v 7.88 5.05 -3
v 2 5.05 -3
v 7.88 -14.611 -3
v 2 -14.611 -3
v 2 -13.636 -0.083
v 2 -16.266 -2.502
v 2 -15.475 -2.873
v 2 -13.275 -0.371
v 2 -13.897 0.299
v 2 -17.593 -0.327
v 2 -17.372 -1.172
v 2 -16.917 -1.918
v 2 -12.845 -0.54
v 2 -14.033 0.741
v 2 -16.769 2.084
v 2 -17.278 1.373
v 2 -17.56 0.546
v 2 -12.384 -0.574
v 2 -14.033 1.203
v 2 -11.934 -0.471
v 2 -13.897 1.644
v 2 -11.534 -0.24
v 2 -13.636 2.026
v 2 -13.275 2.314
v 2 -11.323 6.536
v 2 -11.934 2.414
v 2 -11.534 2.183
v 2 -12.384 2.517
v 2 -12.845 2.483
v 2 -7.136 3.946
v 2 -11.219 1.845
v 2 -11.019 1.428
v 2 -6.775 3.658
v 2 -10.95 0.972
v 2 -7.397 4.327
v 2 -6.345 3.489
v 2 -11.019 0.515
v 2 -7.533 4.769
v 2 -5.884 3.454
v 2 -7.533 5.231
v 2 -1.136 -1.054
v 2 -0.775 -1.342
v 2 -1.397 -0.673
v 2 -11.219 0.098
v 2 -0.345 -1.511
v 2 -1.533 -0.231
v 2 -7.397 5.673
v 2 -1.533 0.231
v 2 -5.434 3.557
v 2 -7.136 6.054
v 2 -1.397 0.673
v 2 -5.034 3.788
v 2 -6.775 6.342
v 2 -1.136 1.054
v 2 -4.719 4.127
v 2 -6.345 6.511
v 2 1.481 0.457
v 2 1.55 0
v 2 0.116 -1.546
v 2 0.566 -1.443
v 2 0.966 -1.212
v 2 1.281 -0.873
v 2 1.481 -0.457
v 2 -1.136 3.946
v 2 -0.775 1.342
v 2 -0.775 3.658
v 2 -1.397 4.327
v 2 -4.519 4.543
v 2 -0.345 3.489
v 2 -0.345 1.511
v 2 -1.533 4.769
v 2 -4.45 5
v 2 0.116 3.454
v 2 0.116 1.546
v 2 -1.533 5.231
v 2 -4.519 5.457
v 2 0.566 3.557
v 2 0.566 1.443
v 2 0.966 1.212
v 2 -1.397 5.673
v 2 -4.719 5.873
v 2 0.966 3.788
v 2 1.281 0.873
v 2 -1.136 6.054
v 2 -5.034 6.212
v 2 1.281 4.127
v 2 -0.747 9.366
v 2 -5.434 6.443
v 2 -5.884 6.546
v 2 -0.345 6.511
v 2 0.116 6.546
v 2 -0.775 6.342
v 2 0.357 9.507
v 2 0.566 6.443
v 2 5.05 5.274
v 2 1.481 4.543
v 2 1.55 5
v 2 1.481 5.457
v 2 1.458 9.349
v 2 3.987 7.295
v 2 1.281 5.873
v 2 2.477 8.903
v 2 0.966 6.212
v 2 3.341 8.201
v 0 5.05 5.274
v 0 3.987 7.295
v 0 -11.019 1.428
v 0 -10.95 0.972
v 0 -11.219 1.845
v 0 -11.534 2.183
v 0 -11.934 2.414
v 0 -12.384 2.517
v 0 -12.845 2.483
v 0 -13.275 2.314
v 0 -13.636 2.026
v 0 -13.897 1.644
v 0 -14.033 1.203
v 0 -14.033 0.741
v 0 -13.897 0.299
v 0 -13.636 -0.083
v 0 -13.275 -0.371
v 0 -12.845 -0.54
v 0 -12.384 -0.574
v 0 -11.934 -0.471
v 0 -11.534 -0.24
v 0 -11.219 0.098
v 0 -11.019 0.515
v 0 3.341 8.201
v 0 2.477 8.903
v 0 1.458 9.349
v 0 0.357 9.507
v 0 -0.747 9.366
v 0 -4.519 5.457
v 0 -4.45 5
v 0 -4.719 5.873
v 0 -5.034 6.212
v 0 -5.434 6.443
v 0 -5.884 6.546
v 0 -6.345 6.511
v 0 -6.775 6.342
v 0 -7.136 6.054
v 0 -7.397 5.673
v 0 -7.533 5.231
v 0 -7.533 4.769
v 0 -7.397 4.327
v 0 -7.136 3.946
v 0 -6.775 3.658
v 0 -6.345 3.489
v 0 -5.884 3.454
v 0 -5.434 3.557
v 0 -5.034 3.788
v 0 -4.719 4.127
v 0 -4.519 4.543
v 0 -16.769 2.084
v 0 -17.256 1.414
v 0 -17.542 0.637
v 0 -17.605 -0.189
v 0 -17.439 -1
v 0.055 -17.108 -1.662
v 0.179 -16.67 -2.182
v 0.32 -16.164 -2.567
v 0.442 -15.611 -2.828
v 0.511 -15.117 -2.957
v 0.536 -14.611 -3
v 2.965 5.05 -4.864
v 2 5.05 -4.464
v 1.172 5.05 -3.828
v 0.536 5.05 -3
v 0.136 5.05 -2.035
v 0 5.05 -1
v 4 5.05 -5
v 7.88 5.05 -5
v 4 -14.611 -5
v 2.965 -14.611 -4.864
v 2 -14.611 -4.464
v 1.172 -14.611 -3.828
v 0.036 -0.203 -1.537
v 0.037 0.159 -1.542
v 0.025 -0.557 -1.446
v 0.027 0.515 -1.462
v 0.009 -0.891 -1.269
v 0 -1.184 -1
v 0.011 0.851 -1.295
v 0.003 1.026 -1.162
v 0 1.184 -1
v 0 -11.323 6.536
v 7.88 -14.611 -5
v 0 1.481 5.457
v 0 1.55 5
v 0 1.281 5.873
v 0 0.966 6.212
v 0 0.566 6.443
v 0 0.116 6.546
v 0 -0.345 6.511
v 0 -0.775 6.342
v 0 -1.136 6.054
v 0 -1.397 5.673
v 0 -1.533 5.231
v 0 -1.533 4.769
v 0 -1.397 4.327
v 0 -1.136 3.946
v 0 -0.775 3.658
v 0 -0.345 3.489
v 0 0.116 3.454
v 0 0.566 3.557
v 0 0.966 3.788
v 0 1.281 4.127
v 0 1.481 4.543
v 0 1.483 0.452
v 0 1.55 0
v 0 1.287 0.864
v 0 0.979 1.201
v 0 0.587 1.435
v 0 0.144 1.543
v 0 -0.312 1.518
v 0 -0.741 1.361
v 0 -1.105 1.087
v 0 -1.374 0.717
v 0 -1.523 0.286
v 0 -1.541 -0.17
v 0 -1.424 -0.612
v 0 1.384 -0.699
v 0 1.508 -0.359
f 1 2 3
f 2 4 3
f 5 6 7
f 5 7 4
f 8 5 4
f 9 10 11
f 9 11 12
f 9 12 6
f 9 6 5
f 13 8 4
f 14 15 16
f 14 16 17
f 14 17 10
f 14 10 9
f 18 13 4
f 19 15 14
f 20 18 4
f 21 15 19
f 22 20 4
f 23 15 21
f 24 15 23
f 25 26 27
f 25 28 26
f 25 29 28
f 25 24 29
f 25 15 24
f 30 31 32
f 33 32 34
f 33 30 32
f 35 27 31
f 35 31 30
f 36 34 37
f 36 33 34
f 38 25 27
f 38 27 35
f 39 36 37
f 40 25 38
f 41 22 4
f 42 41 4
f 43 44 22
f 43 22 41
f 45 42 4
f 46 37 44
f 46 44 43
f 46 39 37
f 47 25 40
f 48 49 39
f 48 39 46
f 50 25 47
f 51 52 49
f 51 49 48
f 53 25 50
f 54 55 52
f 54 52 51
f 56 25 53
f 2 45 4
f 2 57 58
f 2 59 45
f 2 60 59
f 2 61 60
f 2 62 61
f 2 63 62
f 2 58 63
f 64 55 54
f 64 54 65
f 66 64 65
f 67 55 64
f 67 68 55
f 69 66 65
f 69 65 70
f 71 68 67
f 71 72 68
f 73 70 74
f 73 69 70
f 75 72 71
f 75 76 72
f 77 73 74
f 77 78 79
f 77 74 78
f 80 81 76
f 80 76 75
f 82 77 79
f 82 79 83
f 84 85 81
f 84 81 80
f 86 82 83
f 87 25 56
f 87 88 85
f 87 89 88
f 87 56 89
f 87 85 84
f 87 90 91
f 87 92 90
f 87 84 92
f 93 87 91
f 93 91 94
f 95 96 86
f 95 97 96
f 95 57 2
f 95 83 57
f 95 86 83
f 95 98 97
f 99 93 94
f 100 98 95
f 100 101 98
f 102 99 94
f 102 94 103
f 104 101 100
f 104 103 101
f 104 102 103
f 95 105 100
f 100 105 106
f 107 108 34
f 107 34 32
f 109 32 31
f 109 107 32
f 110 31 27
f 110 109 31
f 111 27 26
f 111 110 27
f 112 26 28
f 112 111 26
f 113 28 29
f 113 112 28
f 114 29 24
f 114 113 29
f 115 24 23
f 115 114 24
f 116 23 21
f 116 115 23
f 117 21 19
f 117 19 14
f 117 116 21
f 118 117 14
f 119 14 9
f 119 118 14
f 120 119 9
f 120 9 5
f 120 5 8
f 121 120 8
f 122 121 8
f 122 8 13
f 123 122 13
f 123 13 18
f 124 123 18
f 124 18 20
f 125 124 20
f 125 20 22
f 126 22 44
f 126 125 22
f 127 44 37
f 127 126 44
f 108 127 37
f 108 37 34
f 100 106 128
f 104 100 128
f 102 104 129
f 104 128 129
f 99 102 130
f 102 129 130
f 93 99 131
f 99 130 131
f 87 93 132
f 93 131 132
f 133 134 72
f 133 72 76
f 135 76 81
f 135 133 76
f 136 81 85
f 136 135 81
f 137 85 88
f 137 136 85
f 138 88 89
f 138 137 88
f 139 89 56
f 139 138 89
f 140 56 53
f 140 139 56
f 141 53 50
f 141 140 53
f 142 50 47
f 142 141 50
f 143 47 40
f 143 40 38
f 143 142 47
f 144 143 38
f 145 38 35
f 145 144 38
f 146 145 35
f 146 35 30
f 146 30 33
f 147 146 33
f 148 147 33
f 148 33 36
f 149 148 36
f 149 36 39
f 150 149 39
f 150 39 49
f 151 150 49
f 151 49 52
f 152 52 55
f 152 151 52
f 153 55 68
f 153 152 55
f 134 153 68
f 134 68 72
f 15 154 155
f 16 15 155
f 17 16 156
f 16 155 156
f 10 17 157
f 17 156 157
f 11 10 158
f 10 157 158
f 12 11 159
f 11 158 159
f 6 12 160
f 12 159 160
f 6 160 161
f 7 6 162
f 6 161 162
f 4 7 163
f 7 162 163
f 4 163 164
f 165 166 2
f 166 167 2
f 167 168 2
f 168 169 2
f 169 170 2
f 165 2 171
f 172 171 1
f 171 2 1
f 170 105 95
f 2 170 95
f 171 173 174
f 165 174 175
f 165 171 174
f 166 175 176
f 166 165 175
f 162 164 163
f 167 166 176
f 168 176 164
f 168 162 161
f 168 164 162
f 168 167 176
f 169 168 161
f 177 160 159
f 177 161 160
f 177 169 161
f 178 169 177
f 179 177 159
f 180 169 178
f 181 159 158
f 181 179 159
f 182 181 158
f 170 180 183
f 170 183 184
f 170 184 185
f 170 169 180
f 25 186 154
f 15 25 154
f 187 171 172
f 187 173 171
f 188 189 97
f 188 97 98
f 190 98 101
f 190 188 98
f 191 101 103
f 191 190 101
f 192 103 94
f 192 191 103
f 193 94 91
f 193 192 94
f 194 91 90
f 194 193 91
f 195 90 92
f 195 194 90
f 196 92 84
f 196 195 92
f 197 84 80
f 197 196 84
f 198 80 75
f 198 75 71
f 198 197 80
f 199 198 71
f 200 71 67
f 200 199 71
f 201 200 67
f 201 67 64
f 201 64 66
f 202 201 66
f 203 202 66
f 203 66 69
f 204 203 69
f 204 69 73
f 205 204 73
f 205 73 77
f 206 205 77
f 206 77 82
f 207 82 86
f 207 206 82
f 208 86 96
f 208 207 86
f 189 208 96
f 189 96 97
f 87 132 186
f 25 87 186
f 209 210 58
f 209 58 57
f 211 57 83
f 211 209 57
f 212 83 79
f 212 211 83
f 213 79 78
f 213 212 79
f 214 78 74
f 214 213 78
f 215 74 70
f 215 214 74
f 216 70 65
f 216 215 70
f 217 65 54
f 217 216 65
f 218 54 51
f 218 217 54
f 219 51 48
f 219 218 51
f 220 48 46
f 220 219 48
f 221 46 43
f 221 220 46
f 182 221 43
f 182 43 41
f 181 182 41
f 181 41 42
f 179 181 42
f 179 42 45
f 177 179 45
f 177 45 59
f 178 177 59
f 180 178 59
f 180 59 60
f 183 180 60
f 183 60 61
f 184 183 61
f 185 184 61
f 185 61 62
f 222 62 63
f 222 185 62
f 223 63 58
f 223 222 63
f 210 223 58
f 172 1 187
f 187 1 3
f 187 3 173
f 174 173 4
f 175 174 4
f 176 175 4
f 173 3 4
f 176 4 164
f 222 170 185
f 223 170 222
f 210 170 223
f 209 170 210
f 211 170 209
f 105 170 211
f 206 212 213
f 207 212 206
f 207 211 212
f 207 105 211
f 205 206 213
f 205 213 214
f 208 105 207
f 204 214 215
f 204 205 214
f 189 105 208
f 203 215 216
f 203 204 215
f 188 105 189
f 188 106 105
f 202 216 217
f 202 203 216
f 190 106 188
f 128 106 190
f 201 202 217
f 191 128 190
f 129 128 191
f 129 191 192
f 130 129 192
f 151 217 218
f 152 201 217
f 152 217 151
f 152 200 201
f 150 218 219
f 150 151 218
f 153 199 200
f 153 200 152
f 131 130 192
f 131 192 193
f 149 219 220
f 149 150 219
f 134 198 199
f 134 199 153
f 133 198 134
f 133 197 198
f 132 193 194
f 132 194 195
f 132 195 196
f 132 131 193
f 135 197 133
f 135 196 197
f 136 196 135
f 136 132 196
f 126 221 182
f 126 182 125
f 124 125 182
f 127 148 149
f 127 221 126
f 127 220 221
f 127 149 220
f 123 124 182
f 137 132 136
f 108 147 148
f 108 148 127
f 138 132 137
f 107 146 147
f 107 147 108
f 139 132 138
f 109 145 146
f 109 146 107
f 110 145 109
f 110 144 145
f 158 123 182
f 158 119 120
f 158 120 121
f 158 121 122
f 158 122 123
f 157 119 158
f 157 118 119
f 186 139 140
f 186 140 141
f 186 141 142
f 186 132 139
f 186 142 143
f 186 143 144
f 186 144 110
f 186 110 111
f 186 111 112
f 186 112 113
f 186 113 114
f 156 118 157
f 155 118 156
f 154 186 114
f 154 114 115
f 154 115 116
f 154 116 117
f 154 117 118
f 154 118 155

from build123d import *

# Parameters (mm, degrees)
F0_R        = 1.55
F1_DEPTH    = 2
F2_W        = 5.8800544143
F2_H        = 19.6606332908
F2_W_2      = 2
F3_DEPTH    = 2
F4_T1_DEPTH = 39.6606332908


# Not quite as in the source:
# - a fillet or chamfer that OpenCascade refuses, or shapes differently, is made with other operations: its cross-section is extruded or revolved along the edge and cut away or added


with BuildPart() as f1:
    # F0 (on Right) → F1 (new body)
    with BuildSketch(Plane.YZ):
        with BuildLine():
            Line((-14.6106332908, -3), (-13.2183143869, -3))
            Line((-13.2183143869, -3), (5.05, -3))
            Line((5.05, -3), (5.05, 5.273589902))
            Line((5.05, 5.273589902), (3.9867715302, 7.2948440555))
            ThreePointArc((3.9867715302, 7.2948440555), (1.9828252763, 9.159944049), (-0.7469684056, 9.3664023457))
            Line((-0.7469684056, 9.3664023457), (-11.3228132649, 6.5356446488))
            Line((-11.3228132649, 6.5356446488), (-16.7690545021, 2.0835589443))
            ThreePointArc((-16.7690545021, 2.0835589443), (-17.372034822, -1.1724596298), (-14.6106332908, -3))
        make_face()
        with Locations((-12.5, 0.9715808555)):
            Circle(F0_R, mode=Mode.SUBTRACT)
        Circle(F0_R, mode=Mode.SUBTRACT)
        with Locations((-6, 5)):
            Circle(F0_R, mode=Mode.SUBTRACT)
        with Locations((0, 5)):
            Circle(F0_R, mode=Mode.SUBTRACT)
    extrude(amount=F1_DEPTH)

    # F2 (on face) → F3 (join)
    with BuildSketch(Plane(origin=(0, 0, -3), x_dir=(1, 0, 0), z_dir=(0, 0, -1))):
        with Locations((4.9400272071, 4.7803166454)):
            Rectangle(F2_W, F2_H)
        with Locations((1, 4.7803166454)):
            Rectangle(F2_W_2, F2_H)
    extrude(amount=F3_DEPTH)

    # F4: fillet of radius 4 on 1 edges, made by hand

    # F4_s2 → F4_t1 (cut)
    with BuildSketch(Plane.XZ.offset(-15.05)):
        with BuildLine():
            ThreePointArc((4, -5), (1.1715728753, -3.8284271247), (0, -1))
            Line((0, -1), (0, -5))
            Line((0, -5), (4, -5))
        make_face()
    extrude(amount=F4_T1_DEPTH, mode=Mode.SUBTRACT)


solid = f1.part
